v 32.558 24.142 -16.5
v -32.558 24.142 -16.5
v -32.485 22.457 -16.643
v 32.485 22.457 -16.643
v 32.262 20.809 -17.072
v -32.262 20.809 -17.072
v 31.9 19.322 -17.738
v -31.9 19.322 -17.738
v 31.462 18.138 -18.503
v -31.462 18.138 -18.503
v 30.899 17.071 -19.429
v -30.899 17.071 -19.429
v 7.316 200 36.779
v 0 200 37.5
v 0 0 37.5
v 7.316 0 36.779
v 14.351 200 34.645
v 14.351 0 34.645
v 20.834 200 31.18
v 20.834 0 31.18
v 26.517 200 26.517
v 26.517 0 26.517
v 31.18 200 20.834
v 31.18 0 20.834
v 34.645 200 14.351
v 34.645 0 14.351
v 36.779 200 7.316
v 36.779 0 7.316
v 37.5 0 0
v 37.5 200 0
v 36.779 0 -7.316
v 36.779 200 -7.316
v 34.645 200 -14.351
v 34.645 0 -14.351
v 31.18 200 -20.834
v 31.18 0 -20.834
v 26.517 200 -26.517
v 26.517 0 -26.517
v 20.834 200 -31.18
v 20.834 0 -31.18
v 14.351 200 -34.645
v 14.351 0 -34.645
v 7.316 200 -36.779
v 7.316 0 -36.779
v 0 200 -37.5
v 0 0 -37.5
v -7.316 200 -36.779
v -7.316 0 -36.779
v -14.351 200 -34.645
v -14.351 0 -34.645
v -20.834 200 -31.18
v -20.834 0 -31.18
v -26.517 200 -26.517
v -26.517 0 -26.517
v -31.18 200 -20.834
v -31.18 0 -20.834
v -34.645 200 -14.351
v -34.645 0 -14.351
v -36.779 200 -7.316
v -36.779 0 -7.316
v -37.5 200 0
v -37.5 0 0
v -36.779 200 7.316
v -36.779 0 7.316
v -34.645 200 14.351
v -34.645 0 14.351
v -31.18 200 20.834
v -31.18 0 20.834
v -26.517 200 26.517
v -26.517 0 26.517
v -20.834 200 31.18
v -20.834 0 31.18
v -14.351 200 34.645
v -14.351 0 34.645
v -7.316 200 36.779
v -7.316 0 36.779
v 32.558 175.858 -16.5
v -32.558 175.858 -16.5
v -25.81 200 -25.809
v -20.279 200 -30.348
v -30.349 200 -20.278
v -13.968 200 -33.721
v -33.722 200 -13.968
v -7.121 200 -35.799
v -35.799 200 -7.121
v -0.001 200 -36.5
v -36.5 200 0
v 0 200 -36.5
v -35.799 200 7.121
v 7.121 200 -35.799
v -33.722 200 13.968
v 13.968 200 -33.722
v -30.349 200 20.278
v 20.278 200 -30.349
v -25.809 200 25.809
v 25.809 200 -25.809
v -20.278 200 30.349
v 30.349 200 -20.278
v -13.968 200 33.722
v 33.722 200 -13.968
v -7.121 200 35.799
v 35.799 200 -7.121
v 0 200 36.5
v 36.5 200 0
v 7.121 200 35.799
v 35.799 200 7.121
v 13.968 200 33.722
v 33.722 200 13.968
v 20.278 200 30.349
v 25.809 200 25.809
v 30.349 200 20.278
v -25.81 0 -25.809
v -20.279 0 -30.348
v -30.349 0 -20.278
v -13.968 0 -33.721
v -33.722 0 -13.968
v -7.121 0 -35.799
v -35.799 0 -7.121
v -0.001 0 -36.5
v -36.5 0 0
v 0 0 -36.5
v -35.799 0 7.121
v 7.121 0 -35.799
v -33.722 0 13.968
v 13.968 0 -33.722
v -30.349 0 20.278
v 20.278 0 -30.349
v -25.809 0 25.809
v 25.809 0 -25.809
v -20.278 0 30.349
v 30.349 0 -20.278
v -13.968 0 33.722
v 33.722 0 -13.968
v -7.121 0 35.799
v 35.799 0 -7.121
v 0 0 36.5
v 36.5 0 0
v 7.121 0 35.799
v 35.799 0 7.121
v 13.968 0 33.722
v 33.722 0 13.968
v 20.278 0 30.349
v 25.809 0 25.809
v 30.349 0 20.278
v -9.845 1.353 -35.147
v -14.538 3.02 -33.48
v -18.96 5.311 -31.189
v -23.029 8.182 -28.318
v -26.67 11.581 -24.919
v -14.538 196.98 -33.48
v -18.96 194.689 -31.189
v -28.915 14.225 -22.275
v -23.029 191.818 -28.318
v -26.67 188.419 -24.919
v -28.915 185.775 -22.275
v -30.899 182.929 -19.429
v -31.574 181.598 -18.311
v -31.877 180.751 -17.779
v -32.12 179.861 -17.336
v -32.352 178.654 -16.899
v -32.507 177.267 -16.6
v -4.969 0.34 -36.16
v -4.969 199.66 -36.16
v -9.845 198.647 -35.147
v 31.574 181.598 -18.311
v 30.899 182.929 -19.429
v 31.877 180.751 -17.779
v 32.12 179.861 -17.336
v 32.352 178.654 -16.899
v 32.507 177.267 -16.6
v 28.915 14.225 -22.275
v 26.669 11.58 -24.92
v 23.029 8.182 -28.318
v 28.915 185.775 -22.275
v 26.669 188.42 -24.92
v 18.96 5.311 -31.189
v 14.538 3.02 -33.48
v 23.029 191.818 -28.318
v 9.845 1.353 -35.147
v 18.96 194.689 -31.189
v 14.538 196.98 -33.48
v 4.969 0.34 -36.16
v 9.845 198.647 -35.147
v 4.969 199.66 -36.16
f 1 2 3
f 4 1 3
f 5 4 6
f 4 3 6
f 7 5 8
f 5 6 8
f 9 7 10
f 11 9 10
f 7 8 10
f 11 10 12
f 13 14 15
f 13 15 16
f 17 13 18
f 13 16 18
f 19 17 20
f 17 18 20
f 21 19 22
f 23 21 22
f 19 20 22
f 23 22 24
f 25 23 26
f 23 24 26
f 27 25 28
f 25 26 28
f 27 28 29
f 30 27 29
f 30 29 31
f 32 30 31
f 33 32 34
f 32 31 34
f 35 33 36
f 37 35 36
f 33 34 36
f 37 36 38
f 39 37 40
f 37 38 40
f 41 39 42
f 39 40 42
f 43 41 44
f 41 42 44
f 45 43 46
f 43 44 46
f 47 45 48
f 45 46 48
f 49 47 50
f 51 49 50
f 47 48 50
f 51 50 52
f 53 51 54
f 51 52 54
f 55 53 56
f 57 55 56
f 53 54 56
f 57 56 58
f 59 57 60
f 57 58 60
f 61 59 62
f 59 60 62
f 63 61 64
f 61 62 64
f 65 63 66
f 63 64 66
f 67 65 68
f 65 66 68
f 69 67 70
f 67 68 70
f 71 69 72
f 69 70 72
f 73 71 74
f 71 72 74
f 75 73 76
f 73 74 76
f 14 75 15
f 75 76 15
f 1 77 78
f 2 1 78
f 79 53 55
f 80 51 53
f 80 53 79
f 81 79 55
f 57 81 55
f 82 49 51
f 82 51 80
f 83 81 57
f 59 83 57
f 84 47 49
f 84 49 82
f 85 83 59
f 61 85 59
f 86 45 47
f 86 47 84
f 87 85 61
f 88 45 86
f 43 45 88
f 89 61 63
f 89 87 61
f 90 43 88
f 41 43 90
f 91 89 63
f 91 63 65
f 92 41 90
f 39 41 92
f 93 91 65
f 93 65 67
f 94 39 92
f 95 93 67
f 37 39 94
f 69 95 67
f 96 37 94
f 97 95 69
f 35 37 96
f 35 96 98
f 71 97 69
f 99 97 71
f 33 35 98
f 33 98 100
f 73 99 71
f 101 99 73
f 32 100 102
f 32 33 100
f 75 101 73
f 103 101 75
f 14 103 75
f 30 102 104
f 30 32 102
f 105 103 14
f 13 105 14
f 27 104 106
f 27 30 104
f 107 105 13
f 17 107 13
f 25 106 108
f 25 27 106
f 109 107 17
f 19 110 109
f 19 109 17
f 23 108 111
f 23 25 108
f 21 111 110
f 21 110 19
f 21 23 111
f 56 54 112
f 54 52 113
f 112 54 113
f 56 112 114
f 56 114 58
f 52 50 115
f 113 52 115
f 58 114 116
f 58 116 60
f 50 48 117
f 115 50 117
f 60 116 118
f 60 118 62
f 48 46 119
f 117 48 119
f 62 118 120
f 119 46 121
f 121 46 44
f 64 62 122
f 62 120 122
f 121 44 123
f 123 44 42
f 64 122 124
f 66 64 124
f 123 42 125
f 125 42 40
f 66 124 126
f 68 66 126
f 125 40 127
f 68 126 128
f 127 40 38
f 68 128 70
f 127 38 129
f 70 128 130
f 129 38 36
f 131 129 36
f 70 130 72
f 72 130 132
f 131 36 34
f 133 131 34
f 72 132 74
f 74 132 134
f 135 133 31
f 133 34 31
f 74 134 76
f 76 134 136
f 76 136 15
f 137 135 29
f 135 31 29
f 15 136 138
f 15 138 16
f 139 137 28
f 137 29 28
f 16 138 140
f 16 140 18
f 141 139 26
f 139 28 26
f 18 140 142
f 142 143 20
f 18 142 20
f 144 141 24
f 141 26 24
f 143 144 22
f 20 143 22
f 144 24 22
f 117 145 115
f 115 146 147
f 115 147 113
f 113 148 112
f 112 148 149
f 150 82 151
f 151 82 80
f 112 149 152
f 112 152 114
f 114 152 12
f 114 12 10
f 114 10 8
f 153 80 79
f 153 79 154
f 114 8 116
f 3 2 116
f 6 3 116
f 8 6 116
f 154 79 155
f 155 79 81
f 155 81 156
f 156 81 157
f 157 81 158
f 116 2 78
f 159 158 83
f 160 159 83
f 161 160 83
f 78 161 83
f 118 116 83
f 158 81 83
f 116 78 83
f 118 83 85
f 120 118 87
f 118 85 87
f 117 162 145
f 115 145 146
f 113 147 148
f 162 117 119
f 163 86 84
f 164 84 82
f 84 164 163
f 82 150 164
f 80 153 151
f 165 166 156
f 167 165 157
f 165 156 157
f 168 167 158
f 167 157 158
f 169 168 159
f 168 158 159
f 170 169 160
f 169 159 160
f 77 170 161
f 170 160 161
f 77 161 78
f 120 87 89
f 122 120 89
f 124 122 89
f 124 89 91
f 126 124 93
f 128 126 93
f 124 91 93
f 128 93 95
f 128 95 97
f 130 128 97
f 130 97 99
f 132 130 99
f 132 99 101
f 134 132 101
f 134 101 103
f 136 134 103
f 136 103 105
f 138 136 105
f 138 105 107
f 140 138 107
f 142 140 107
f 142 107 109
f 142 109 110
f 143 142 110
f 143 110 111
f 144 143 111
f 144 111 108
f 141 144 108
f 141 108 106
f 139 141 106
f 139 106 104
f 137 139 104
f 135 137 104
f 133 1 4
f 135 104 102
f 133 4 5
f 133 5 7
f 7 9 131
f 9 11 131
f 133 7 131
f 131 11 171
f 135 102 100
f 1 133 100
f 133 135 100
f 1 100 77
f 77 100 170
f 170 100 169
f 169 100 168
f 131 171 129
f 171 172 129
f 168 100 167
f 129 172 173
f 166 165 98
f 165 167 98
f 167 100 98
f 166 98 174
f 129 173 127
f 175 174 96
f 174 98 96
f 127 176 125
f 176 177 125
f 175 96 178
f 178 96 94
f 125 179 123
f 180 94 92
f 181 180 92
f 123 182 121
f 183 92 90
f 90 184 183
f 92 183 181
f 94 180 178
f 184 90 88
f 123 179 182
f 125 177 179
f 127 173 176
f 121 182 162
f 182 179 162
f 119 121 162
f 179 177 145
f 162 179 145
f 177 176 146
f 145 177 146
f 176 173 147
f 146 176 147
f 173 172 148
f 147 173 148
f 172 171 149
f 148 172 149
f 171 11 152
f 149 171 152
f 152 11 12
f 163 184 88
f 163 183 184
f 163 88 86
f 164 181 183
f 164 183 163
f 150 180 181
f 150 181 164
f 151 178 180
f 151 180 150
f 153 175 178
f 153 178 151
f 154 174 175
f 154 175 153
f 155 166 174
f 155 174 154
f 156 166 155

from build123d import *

# Parameters (mm, degrees)
SCHIZZO1_R                   = 37.5
ESTRUSIONE_ESTRUSIONE1_DEPTH = 200
TAGLIO_ESTRUSIONE2_DEPTH     = 207.911816966
SMUSSO3_SIZE                 = 20
RACCORDO1_R                  = 10


with BuildPart() as part:
    # Schizzo1 → Estrusione-Estrusione1 (new body)
    with BuildSketch(Plane(origin=(0, 0, 0), x_dir=(-1, 0, 0), z_dir=(0, 1, 0))):
        with Locations(Location((0, 0, 0), (0, 0, 90))):
            Circle(SCHIZZO1_R)
    extrude(amount=ESTRUSIONE_ESTRUSIONE1_DEPTH)

    # Schizzo2 → Taglio-Estrusione2 (cut, through all)
    with BuildSketch(Plane(origin=(0, 200, 0), x_dir=(-1, 0, 0), z_dir=(0, 1, 0))):
        with BuildLine():
            ThreePointArc((36.5, 0), (-8.482219535, 35.500731707), (-32.557641192, -16.5))
            Line((-32.557641192, -16.5), (32.557641192, -16.5))
            ThreePointArc((32.557641192, -16.5), (35.500731707, -8.482219535), (36.5, 0))
        make_face()
    extrude(amount=-TAGLIO_ESTRUSIONE2_DEPTH, mode=Mode.SUBTRACT)

    # Smusso3
    smusso3_edges = [part.edges().sort_by_distance(p)[0] for p in [
        (0, 0, -16.5),
        (0, 200, -16.5),
    ]]
    chamfer(smusso3_edges, length=SMUSSO3_SIZE)

    # Raccordo1
    raccordo1_edges = [part.edges().sort_by_distance(p)[0] for p in [
        (0, 20, -16.5),
        (0, 180, -16.5),
    ]]
    fillet(raccordo1_edges, radius=RACCORDO1_R)


solid = part.part
